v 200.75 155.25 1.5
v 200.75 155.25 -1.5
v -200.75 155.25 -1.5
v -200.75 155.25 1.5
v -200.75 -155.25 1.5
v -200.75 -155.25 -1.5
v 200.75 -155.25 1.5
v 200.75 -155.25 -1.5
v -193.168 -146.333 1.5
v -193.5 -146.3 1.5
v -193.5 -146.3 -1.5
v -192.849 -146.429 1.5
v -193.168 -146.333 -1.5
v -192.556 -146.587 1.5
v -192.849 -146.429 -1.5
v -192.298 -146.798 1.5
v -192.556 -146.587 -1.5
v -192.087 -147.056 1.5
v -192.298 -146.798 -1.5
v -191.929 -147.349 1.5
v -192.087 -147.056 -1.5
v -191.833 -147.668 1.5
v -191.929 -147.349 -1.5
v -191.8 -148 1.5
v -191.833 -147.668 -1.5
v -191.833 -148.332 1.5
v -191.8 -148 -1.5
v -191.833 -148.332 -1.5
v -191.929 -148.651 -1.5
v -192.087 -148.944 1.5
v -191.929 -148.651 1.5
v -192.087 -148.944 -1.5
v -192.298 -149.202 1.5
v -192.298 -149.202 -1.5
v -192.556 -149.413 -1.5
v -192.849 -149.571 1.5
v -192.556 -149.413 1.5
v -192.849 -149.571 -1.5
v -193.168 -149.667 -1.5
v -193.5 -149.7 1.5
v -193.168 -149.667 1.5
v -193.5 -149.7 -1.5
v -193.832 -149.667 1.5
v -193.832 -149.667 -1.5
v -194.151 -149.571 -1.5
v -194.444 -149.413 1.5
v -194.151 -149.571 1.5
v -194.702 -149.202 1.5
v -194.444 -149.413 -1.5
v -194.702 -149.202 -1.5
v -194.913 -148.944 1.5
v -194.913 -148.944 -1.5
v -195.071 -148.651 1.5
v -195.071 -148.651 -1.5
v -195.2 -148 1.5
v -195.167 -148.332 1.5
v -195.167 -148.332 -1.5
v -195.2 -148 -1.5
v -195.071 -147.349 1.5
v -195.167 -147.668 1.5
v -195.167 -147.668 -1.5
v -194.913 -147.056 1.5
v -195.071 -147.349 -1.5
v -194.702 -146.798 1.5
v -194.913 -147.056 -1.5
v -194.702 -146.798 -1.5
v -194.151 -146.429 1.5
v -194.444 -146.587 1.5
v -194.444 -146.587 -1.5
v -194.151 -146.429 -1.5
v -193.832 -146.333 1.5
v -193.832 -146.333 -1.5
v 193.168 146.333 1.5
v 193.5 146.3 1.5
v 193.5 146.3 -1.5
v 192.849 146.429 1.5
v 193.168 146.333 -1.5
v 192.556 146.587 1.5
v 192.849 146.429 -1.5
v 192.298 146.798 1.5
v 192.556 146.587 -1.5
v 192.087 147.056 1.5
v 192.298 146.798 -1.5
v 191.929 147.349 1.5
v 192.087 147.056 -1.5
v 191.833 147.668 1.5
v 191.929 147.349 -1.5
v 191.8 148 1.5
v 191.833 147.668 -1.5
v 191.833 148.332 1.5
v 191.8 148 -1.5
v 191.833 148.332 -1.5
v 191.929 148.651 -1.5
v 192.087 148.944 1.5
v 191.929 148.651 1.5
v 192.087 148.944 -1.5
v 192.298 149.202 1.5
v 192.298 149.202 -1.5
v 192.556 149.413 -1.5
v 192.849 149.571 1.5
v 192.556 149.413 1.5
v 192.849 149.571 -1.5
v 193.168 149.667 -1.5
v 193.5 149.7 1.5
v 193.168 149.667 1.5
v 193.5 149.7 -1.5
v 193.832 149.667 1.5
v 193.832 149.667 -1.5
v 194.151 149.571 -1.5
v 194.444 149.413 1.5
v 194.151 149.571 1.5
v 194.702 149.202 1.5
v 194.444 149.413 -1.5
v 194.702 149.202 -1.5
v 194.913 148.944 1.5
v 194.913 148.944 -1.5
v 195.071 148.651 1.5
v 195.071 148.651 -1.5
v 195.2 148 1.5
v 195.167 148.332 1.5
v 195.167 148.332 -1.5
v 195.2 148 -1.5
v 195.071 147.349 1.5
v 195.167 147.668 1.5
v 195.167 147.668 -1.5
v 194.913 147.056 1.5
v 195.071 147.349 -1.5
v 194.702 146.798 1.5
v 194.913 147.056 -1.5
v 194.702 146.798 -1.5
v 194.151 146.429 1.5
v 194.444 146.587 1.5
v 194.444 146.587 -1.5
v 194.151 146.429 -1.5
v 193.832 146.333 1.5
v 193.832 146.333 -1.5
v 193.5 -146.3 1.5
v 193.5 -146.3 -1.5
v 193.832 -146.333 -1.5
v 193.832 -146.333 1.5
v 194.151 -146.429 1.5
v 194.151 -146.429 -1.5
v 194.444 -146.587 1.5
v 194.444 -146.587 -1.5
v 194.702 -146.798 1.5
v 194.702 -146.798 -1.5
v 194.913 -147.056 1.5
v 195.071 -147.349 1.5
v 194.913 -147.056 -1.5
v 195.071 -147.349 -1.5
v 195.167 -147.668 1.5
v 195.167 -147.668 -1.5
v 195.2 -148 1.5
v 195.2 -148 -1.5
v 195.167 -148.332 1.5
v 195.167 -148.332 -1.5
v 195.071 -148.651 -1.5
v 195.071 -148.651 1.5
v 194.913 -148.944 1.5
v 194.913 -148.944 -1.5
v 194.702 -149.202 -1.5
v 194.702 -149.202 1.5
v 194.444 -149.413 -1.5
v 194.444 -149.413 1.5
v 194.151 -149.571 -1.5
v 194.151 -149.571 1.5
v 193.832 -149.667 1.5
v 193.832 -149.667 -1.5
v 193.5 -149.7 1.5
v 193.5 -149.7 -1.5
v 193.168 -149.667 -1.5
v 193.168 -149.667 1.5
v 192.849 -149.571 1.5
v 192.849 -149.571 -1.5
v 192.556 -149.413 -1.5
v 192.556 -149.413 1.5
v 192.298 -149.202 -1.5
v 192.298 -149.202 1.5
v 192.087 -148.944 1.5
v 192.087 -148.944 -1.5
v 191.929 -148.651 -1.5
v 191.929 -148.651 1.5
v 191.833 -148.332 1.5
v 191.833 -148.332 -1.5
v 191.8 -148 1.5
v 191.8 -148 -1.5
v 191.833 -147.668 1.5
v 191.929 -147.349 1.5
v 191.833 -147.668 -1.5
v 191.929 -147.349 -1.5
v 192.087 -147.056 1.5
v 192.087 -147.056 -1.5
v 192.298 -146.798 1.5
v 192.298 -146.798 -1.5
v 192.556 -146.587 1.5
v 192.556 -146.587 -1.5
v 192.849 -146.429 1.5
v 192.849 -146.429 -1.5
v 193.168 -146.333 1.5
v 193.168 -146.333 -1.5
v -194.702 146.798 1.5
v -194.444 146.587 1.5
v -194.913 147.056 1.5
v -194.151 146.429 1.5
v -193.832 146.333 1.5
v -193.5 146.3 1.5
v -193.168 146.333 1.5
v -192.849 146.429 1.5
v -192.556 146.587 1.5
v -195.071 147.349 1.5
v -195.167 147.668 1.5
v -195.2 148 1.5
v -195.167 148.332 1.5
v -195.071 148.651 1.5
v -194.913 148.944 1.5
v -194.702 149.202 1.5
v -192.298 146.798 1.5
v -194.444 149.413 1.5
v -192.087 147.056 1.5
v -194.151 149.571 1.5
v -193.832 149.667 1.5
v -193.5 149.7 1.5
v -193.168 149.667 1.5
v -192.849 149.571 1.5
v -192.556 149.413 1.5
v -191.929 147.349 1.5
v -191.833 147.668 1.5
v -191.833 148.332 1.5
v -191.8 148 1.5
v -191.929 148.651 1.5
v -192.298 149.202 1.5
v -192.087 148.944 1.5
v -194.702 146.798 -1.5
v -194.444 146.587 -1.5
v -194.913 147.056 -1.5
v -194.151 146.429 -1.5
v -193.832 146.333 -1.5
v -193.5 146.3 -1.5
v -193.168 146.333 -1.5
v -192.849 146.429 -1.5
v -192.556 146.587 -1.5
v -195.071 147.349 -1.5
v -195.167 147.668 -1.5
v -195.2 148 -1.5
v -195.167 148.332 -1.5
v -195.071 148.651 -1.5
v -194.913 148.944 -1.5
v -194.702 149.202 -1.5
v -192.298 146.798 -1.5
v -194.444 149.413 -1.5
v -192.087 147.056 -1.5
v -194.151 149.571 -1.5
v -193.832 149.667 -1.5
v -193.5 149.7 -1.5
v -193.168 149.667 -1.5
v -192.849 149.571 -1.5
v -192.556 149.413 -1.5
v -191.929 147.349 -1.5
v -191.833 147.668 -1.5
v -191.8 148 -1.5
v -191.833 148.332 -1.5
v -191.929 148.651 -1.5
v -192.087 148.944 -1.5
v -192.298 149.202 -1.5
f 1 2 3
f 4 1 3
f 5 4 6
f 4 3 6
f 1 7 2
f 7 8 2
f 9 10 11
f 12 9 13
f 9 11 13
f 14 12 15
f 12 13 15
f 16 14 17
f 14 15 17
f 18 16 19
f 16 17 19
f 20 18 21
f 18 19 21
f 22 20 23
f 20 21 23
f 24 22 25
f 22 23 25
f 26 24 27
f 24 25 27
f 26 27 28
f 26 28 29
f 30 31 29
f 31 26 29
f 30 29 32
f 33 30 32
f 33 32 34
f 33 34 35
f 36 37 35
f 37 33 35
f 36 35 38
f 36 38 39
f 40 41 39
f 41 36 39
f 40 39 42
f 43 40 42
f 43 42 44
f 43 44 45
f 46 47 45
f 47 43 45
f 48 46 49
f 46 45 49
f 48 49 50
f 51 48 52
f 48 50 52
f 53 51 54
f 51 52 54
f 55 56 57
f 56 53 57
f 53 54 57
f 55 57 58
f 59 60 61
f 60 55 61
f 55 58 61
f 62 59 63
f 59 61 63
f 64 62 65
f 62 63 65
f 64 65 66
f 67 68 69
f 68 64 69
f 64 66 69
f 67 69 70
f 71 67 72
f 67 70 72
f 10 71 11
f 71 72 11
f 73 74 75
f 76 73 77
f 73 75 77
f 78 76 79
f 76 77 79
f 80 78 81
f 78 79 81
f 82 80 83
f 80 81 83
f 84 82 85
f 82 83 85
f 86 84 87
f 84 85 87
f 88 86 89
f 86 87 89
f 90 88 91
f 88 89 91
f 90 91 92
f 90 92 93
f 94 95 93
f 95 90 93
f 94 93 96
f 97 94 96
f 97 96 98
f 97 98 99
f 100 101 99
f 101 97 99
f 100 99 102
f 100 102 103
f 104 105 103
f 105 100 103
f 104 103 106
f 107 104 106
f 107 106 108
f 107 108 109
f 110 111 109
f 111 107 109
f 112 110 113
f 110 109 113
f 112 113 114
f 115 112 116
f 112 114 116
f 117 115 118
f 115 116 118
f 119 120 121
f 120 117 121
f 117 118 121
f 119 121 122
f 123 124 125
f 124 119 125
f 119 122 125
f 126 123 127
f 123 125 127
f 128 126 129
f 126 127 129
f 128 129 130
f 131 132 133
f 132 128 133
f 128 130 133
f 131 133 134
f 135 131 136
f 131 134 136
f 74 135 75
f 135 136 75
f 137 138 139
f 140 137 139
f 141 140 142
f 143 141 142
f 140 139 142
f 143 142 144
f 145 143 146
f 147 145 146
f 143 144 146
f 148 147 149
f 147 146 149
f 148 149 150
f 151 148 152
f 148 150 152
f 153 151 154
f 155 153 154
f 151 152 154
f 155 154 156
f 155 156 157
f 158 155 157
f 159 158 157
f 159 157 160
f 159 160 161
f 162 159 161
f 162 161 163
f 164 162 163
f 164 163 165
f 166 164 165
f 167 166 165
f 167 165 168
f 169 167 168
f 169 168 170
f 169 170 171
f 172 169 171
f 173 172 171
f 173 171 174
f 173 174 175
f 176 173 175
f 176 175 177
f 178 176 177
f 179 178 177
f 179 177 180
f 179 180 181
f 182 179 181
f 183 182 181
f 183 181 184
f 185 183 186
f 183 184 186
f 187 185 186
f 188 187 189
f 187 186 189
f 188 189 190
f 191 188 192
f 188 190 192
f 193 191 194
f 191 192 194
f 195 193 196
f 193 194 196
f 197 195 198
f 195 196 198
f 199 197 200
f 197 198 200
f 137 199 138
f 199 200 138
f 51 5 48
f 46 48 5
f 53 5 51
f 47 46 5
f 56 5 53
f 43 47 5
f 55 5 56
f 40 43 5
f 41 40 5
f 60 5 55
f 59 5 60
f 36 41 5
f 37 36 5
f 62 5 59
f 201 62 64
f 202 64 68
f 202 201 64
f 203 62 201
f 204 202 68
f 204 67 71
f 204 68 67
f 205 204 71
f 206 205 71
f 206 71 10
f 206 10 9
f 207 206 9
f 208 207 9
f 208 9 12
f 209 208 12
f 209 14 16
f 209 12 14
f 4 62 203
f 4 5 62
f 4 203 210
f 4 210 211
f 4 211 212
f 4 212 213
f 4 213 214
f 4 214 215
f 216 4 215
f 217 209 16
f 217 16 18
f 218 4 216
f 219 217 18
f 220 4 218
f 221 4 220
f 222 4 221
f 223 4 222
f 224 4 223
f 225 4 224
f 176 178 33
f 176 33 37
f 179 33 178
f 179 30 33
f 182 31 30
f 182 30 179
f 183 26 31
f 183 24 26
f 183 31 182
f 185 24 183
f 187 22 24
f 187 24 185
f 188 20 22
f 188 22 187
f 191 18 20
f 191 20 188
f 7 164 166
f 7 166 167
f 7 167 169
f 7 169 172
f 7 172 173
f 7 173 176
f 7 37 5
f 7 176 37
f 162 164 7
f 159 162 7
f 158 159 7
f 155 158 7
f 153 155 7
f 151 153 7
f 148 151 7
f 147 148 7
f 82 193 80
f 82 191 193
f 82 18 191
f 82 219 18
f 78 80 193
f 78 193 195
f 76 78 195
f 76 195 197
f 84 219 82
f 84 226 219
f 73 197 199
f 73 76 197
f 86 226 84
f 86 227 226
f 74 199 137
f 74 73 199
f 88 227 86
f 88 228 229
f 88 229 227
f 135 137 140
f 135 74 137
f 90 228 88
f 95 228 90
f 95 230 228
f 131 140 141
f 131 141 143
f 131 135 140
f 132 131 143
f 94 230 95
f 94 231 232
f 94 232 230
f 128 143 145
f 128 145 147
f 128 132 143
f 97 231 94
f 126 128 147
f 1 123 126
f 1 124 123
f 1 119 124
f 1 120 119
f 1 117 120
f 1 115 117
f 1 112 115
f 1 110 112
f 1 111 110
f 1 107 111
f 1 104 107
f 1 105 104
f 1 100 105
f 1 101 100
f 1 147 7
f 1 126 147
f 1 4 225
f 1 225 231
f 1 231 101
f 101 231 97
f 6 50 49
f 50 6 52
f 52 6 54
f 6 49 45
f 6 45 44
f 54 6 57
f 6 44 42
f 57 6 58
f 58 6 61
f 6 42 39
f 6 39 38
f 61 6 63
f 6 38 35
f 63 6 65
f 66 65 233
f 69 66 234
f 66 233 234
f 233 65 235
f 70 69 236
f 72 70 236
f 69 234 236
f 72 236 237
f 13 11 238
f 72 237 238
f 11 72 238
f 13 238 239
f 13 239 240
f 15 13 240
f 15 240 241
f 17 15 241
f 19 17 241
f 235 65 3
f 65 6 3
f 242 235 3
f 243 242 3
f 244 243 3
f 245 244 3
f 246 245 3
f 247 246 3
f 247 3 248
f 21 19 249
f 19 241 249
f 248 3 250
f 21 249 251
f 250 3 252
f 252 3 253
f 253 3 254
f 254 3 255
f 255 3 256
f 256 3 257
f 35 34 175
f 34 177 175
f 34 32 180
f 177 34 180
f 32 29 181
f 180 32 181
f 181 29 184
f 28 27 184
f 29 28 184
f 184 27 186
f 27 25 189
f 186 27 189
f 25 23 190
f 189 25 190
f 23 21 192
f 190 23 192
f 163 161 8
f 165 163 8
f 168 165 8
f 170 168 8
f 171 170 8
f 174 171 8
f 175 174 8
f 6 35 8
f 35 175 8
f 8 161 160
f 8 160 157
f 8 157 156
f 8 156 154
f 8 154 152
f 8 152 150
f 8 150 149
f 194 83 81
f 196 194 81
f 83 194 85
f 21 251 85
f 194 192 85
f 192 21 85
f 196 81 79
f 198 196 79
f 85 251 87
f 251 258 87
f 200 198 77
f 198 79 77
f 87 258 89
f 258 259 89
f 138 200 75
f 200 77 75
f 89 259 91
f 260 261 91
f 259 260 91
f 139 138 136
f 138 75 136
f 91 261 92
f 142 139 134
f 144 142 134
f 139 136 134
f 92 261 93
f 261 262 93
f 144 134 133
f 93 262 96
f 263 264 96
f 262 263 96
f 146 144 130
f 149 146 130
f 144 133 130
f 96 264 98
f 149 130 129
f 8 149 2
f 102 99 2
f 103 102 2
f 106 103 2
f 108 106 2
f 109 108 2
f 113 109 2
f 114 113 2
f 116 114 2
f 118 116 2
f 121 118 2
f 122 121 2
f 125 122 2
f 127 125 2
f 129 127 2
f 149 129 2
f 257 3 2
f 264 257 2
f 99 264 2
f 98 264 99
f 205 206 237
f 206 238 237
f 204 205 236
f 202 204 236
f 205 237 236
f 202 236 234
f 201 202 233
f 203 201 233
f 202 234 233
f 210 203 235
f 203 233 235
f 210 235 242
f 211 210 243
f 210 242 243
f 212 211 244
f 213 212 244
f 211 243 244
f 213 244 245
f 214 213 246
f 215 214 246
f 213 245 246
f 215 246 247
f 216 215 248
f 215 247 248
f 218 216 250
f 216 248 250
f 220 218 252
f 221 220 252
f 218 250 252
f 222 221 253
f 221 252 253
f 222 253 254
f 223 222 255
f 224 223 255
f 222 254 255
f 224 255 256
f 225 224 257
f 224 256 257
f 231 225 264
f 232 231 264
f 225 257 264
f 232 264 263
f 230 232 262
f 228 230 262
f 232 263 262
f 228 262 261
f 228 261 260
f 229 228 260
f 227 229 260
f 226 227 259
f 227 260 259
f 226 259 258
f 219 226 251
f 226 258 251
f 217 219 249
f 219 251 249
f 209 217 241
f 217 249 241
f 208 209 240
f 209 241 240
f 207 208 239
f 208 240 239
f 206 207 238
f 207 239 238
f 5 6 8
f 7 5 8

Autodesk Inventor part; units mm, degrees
ref_plane "YZ Plane" through (0, 0, 0) normal (1, 0, 0) x (0, 1, 0)
ref_plane "XZ Plane" through (0, 0, 0) normal (0, 1, 0) x (-1, 0, 0)
ref_plane "XY Plane" through (0, 0, 0) normal (0, 0, 1) x (1, 0, 0)
sketch "Esquisse1" plane through (0, 0, 0) normal (0, 0, 1) x (1, 0, 0)
  line L0 (-200.75, -155.25) -> (200.75, -155.25)
  line L1 (200.75, -155.25) -> (200.75, 155.25)
  line L2 (200.75, 155.25) -> (-200.75, 155.25)
  line L3 (-200.75, 155.25) -> (-200.75, -155.25)
  line L4 (-200.75, -155.25) -> (200.75, 155.25) construction
  line L5 (200.75, -155.25) -> (-200.75, 155.25) construction
  point P0 (0, 0)
  dimension "Longueur_plaque_supérieur" = 401.5
  dimension "Profondeur_plaque_supérieur" = 310.5
extrude "Embase" add sketch "Esquisse1" along normal mid plane 3
sketch "Esquisse2" plane through (0, 0, 1.5) normal (0, 0, 1) x (1, 0, 0)
  line L0 (-200.75, 155.25) -> (-200.75, -155.25) construction
  line L1 (200.75, 155.25) -> (-200.75, 155.25) construction
  point P0 (0, 0)
  point P1 (-193.5, 148)
  dimension "d4" = 7.25
  dimension "d5" = 7.25
hole "Perçage" at (-193.5, 148, 1.5) direction (0, 0, -1) diameter 3.4 end through all clearance for "Vis à tête plate fraisée ISO 2009/7046" size "M3" standard "ISO"
mirror "Symétrie1" about plane through (0, 0, 0) normal (1, 0, 0) of "Perçage"
mirror "Symétrie2" about plane through (0, 0, 0) normal (0, 1, 0) of "Perçage", "Symétrie1"
properties part number "Plaque superieur" material "Plastique PMMA"
